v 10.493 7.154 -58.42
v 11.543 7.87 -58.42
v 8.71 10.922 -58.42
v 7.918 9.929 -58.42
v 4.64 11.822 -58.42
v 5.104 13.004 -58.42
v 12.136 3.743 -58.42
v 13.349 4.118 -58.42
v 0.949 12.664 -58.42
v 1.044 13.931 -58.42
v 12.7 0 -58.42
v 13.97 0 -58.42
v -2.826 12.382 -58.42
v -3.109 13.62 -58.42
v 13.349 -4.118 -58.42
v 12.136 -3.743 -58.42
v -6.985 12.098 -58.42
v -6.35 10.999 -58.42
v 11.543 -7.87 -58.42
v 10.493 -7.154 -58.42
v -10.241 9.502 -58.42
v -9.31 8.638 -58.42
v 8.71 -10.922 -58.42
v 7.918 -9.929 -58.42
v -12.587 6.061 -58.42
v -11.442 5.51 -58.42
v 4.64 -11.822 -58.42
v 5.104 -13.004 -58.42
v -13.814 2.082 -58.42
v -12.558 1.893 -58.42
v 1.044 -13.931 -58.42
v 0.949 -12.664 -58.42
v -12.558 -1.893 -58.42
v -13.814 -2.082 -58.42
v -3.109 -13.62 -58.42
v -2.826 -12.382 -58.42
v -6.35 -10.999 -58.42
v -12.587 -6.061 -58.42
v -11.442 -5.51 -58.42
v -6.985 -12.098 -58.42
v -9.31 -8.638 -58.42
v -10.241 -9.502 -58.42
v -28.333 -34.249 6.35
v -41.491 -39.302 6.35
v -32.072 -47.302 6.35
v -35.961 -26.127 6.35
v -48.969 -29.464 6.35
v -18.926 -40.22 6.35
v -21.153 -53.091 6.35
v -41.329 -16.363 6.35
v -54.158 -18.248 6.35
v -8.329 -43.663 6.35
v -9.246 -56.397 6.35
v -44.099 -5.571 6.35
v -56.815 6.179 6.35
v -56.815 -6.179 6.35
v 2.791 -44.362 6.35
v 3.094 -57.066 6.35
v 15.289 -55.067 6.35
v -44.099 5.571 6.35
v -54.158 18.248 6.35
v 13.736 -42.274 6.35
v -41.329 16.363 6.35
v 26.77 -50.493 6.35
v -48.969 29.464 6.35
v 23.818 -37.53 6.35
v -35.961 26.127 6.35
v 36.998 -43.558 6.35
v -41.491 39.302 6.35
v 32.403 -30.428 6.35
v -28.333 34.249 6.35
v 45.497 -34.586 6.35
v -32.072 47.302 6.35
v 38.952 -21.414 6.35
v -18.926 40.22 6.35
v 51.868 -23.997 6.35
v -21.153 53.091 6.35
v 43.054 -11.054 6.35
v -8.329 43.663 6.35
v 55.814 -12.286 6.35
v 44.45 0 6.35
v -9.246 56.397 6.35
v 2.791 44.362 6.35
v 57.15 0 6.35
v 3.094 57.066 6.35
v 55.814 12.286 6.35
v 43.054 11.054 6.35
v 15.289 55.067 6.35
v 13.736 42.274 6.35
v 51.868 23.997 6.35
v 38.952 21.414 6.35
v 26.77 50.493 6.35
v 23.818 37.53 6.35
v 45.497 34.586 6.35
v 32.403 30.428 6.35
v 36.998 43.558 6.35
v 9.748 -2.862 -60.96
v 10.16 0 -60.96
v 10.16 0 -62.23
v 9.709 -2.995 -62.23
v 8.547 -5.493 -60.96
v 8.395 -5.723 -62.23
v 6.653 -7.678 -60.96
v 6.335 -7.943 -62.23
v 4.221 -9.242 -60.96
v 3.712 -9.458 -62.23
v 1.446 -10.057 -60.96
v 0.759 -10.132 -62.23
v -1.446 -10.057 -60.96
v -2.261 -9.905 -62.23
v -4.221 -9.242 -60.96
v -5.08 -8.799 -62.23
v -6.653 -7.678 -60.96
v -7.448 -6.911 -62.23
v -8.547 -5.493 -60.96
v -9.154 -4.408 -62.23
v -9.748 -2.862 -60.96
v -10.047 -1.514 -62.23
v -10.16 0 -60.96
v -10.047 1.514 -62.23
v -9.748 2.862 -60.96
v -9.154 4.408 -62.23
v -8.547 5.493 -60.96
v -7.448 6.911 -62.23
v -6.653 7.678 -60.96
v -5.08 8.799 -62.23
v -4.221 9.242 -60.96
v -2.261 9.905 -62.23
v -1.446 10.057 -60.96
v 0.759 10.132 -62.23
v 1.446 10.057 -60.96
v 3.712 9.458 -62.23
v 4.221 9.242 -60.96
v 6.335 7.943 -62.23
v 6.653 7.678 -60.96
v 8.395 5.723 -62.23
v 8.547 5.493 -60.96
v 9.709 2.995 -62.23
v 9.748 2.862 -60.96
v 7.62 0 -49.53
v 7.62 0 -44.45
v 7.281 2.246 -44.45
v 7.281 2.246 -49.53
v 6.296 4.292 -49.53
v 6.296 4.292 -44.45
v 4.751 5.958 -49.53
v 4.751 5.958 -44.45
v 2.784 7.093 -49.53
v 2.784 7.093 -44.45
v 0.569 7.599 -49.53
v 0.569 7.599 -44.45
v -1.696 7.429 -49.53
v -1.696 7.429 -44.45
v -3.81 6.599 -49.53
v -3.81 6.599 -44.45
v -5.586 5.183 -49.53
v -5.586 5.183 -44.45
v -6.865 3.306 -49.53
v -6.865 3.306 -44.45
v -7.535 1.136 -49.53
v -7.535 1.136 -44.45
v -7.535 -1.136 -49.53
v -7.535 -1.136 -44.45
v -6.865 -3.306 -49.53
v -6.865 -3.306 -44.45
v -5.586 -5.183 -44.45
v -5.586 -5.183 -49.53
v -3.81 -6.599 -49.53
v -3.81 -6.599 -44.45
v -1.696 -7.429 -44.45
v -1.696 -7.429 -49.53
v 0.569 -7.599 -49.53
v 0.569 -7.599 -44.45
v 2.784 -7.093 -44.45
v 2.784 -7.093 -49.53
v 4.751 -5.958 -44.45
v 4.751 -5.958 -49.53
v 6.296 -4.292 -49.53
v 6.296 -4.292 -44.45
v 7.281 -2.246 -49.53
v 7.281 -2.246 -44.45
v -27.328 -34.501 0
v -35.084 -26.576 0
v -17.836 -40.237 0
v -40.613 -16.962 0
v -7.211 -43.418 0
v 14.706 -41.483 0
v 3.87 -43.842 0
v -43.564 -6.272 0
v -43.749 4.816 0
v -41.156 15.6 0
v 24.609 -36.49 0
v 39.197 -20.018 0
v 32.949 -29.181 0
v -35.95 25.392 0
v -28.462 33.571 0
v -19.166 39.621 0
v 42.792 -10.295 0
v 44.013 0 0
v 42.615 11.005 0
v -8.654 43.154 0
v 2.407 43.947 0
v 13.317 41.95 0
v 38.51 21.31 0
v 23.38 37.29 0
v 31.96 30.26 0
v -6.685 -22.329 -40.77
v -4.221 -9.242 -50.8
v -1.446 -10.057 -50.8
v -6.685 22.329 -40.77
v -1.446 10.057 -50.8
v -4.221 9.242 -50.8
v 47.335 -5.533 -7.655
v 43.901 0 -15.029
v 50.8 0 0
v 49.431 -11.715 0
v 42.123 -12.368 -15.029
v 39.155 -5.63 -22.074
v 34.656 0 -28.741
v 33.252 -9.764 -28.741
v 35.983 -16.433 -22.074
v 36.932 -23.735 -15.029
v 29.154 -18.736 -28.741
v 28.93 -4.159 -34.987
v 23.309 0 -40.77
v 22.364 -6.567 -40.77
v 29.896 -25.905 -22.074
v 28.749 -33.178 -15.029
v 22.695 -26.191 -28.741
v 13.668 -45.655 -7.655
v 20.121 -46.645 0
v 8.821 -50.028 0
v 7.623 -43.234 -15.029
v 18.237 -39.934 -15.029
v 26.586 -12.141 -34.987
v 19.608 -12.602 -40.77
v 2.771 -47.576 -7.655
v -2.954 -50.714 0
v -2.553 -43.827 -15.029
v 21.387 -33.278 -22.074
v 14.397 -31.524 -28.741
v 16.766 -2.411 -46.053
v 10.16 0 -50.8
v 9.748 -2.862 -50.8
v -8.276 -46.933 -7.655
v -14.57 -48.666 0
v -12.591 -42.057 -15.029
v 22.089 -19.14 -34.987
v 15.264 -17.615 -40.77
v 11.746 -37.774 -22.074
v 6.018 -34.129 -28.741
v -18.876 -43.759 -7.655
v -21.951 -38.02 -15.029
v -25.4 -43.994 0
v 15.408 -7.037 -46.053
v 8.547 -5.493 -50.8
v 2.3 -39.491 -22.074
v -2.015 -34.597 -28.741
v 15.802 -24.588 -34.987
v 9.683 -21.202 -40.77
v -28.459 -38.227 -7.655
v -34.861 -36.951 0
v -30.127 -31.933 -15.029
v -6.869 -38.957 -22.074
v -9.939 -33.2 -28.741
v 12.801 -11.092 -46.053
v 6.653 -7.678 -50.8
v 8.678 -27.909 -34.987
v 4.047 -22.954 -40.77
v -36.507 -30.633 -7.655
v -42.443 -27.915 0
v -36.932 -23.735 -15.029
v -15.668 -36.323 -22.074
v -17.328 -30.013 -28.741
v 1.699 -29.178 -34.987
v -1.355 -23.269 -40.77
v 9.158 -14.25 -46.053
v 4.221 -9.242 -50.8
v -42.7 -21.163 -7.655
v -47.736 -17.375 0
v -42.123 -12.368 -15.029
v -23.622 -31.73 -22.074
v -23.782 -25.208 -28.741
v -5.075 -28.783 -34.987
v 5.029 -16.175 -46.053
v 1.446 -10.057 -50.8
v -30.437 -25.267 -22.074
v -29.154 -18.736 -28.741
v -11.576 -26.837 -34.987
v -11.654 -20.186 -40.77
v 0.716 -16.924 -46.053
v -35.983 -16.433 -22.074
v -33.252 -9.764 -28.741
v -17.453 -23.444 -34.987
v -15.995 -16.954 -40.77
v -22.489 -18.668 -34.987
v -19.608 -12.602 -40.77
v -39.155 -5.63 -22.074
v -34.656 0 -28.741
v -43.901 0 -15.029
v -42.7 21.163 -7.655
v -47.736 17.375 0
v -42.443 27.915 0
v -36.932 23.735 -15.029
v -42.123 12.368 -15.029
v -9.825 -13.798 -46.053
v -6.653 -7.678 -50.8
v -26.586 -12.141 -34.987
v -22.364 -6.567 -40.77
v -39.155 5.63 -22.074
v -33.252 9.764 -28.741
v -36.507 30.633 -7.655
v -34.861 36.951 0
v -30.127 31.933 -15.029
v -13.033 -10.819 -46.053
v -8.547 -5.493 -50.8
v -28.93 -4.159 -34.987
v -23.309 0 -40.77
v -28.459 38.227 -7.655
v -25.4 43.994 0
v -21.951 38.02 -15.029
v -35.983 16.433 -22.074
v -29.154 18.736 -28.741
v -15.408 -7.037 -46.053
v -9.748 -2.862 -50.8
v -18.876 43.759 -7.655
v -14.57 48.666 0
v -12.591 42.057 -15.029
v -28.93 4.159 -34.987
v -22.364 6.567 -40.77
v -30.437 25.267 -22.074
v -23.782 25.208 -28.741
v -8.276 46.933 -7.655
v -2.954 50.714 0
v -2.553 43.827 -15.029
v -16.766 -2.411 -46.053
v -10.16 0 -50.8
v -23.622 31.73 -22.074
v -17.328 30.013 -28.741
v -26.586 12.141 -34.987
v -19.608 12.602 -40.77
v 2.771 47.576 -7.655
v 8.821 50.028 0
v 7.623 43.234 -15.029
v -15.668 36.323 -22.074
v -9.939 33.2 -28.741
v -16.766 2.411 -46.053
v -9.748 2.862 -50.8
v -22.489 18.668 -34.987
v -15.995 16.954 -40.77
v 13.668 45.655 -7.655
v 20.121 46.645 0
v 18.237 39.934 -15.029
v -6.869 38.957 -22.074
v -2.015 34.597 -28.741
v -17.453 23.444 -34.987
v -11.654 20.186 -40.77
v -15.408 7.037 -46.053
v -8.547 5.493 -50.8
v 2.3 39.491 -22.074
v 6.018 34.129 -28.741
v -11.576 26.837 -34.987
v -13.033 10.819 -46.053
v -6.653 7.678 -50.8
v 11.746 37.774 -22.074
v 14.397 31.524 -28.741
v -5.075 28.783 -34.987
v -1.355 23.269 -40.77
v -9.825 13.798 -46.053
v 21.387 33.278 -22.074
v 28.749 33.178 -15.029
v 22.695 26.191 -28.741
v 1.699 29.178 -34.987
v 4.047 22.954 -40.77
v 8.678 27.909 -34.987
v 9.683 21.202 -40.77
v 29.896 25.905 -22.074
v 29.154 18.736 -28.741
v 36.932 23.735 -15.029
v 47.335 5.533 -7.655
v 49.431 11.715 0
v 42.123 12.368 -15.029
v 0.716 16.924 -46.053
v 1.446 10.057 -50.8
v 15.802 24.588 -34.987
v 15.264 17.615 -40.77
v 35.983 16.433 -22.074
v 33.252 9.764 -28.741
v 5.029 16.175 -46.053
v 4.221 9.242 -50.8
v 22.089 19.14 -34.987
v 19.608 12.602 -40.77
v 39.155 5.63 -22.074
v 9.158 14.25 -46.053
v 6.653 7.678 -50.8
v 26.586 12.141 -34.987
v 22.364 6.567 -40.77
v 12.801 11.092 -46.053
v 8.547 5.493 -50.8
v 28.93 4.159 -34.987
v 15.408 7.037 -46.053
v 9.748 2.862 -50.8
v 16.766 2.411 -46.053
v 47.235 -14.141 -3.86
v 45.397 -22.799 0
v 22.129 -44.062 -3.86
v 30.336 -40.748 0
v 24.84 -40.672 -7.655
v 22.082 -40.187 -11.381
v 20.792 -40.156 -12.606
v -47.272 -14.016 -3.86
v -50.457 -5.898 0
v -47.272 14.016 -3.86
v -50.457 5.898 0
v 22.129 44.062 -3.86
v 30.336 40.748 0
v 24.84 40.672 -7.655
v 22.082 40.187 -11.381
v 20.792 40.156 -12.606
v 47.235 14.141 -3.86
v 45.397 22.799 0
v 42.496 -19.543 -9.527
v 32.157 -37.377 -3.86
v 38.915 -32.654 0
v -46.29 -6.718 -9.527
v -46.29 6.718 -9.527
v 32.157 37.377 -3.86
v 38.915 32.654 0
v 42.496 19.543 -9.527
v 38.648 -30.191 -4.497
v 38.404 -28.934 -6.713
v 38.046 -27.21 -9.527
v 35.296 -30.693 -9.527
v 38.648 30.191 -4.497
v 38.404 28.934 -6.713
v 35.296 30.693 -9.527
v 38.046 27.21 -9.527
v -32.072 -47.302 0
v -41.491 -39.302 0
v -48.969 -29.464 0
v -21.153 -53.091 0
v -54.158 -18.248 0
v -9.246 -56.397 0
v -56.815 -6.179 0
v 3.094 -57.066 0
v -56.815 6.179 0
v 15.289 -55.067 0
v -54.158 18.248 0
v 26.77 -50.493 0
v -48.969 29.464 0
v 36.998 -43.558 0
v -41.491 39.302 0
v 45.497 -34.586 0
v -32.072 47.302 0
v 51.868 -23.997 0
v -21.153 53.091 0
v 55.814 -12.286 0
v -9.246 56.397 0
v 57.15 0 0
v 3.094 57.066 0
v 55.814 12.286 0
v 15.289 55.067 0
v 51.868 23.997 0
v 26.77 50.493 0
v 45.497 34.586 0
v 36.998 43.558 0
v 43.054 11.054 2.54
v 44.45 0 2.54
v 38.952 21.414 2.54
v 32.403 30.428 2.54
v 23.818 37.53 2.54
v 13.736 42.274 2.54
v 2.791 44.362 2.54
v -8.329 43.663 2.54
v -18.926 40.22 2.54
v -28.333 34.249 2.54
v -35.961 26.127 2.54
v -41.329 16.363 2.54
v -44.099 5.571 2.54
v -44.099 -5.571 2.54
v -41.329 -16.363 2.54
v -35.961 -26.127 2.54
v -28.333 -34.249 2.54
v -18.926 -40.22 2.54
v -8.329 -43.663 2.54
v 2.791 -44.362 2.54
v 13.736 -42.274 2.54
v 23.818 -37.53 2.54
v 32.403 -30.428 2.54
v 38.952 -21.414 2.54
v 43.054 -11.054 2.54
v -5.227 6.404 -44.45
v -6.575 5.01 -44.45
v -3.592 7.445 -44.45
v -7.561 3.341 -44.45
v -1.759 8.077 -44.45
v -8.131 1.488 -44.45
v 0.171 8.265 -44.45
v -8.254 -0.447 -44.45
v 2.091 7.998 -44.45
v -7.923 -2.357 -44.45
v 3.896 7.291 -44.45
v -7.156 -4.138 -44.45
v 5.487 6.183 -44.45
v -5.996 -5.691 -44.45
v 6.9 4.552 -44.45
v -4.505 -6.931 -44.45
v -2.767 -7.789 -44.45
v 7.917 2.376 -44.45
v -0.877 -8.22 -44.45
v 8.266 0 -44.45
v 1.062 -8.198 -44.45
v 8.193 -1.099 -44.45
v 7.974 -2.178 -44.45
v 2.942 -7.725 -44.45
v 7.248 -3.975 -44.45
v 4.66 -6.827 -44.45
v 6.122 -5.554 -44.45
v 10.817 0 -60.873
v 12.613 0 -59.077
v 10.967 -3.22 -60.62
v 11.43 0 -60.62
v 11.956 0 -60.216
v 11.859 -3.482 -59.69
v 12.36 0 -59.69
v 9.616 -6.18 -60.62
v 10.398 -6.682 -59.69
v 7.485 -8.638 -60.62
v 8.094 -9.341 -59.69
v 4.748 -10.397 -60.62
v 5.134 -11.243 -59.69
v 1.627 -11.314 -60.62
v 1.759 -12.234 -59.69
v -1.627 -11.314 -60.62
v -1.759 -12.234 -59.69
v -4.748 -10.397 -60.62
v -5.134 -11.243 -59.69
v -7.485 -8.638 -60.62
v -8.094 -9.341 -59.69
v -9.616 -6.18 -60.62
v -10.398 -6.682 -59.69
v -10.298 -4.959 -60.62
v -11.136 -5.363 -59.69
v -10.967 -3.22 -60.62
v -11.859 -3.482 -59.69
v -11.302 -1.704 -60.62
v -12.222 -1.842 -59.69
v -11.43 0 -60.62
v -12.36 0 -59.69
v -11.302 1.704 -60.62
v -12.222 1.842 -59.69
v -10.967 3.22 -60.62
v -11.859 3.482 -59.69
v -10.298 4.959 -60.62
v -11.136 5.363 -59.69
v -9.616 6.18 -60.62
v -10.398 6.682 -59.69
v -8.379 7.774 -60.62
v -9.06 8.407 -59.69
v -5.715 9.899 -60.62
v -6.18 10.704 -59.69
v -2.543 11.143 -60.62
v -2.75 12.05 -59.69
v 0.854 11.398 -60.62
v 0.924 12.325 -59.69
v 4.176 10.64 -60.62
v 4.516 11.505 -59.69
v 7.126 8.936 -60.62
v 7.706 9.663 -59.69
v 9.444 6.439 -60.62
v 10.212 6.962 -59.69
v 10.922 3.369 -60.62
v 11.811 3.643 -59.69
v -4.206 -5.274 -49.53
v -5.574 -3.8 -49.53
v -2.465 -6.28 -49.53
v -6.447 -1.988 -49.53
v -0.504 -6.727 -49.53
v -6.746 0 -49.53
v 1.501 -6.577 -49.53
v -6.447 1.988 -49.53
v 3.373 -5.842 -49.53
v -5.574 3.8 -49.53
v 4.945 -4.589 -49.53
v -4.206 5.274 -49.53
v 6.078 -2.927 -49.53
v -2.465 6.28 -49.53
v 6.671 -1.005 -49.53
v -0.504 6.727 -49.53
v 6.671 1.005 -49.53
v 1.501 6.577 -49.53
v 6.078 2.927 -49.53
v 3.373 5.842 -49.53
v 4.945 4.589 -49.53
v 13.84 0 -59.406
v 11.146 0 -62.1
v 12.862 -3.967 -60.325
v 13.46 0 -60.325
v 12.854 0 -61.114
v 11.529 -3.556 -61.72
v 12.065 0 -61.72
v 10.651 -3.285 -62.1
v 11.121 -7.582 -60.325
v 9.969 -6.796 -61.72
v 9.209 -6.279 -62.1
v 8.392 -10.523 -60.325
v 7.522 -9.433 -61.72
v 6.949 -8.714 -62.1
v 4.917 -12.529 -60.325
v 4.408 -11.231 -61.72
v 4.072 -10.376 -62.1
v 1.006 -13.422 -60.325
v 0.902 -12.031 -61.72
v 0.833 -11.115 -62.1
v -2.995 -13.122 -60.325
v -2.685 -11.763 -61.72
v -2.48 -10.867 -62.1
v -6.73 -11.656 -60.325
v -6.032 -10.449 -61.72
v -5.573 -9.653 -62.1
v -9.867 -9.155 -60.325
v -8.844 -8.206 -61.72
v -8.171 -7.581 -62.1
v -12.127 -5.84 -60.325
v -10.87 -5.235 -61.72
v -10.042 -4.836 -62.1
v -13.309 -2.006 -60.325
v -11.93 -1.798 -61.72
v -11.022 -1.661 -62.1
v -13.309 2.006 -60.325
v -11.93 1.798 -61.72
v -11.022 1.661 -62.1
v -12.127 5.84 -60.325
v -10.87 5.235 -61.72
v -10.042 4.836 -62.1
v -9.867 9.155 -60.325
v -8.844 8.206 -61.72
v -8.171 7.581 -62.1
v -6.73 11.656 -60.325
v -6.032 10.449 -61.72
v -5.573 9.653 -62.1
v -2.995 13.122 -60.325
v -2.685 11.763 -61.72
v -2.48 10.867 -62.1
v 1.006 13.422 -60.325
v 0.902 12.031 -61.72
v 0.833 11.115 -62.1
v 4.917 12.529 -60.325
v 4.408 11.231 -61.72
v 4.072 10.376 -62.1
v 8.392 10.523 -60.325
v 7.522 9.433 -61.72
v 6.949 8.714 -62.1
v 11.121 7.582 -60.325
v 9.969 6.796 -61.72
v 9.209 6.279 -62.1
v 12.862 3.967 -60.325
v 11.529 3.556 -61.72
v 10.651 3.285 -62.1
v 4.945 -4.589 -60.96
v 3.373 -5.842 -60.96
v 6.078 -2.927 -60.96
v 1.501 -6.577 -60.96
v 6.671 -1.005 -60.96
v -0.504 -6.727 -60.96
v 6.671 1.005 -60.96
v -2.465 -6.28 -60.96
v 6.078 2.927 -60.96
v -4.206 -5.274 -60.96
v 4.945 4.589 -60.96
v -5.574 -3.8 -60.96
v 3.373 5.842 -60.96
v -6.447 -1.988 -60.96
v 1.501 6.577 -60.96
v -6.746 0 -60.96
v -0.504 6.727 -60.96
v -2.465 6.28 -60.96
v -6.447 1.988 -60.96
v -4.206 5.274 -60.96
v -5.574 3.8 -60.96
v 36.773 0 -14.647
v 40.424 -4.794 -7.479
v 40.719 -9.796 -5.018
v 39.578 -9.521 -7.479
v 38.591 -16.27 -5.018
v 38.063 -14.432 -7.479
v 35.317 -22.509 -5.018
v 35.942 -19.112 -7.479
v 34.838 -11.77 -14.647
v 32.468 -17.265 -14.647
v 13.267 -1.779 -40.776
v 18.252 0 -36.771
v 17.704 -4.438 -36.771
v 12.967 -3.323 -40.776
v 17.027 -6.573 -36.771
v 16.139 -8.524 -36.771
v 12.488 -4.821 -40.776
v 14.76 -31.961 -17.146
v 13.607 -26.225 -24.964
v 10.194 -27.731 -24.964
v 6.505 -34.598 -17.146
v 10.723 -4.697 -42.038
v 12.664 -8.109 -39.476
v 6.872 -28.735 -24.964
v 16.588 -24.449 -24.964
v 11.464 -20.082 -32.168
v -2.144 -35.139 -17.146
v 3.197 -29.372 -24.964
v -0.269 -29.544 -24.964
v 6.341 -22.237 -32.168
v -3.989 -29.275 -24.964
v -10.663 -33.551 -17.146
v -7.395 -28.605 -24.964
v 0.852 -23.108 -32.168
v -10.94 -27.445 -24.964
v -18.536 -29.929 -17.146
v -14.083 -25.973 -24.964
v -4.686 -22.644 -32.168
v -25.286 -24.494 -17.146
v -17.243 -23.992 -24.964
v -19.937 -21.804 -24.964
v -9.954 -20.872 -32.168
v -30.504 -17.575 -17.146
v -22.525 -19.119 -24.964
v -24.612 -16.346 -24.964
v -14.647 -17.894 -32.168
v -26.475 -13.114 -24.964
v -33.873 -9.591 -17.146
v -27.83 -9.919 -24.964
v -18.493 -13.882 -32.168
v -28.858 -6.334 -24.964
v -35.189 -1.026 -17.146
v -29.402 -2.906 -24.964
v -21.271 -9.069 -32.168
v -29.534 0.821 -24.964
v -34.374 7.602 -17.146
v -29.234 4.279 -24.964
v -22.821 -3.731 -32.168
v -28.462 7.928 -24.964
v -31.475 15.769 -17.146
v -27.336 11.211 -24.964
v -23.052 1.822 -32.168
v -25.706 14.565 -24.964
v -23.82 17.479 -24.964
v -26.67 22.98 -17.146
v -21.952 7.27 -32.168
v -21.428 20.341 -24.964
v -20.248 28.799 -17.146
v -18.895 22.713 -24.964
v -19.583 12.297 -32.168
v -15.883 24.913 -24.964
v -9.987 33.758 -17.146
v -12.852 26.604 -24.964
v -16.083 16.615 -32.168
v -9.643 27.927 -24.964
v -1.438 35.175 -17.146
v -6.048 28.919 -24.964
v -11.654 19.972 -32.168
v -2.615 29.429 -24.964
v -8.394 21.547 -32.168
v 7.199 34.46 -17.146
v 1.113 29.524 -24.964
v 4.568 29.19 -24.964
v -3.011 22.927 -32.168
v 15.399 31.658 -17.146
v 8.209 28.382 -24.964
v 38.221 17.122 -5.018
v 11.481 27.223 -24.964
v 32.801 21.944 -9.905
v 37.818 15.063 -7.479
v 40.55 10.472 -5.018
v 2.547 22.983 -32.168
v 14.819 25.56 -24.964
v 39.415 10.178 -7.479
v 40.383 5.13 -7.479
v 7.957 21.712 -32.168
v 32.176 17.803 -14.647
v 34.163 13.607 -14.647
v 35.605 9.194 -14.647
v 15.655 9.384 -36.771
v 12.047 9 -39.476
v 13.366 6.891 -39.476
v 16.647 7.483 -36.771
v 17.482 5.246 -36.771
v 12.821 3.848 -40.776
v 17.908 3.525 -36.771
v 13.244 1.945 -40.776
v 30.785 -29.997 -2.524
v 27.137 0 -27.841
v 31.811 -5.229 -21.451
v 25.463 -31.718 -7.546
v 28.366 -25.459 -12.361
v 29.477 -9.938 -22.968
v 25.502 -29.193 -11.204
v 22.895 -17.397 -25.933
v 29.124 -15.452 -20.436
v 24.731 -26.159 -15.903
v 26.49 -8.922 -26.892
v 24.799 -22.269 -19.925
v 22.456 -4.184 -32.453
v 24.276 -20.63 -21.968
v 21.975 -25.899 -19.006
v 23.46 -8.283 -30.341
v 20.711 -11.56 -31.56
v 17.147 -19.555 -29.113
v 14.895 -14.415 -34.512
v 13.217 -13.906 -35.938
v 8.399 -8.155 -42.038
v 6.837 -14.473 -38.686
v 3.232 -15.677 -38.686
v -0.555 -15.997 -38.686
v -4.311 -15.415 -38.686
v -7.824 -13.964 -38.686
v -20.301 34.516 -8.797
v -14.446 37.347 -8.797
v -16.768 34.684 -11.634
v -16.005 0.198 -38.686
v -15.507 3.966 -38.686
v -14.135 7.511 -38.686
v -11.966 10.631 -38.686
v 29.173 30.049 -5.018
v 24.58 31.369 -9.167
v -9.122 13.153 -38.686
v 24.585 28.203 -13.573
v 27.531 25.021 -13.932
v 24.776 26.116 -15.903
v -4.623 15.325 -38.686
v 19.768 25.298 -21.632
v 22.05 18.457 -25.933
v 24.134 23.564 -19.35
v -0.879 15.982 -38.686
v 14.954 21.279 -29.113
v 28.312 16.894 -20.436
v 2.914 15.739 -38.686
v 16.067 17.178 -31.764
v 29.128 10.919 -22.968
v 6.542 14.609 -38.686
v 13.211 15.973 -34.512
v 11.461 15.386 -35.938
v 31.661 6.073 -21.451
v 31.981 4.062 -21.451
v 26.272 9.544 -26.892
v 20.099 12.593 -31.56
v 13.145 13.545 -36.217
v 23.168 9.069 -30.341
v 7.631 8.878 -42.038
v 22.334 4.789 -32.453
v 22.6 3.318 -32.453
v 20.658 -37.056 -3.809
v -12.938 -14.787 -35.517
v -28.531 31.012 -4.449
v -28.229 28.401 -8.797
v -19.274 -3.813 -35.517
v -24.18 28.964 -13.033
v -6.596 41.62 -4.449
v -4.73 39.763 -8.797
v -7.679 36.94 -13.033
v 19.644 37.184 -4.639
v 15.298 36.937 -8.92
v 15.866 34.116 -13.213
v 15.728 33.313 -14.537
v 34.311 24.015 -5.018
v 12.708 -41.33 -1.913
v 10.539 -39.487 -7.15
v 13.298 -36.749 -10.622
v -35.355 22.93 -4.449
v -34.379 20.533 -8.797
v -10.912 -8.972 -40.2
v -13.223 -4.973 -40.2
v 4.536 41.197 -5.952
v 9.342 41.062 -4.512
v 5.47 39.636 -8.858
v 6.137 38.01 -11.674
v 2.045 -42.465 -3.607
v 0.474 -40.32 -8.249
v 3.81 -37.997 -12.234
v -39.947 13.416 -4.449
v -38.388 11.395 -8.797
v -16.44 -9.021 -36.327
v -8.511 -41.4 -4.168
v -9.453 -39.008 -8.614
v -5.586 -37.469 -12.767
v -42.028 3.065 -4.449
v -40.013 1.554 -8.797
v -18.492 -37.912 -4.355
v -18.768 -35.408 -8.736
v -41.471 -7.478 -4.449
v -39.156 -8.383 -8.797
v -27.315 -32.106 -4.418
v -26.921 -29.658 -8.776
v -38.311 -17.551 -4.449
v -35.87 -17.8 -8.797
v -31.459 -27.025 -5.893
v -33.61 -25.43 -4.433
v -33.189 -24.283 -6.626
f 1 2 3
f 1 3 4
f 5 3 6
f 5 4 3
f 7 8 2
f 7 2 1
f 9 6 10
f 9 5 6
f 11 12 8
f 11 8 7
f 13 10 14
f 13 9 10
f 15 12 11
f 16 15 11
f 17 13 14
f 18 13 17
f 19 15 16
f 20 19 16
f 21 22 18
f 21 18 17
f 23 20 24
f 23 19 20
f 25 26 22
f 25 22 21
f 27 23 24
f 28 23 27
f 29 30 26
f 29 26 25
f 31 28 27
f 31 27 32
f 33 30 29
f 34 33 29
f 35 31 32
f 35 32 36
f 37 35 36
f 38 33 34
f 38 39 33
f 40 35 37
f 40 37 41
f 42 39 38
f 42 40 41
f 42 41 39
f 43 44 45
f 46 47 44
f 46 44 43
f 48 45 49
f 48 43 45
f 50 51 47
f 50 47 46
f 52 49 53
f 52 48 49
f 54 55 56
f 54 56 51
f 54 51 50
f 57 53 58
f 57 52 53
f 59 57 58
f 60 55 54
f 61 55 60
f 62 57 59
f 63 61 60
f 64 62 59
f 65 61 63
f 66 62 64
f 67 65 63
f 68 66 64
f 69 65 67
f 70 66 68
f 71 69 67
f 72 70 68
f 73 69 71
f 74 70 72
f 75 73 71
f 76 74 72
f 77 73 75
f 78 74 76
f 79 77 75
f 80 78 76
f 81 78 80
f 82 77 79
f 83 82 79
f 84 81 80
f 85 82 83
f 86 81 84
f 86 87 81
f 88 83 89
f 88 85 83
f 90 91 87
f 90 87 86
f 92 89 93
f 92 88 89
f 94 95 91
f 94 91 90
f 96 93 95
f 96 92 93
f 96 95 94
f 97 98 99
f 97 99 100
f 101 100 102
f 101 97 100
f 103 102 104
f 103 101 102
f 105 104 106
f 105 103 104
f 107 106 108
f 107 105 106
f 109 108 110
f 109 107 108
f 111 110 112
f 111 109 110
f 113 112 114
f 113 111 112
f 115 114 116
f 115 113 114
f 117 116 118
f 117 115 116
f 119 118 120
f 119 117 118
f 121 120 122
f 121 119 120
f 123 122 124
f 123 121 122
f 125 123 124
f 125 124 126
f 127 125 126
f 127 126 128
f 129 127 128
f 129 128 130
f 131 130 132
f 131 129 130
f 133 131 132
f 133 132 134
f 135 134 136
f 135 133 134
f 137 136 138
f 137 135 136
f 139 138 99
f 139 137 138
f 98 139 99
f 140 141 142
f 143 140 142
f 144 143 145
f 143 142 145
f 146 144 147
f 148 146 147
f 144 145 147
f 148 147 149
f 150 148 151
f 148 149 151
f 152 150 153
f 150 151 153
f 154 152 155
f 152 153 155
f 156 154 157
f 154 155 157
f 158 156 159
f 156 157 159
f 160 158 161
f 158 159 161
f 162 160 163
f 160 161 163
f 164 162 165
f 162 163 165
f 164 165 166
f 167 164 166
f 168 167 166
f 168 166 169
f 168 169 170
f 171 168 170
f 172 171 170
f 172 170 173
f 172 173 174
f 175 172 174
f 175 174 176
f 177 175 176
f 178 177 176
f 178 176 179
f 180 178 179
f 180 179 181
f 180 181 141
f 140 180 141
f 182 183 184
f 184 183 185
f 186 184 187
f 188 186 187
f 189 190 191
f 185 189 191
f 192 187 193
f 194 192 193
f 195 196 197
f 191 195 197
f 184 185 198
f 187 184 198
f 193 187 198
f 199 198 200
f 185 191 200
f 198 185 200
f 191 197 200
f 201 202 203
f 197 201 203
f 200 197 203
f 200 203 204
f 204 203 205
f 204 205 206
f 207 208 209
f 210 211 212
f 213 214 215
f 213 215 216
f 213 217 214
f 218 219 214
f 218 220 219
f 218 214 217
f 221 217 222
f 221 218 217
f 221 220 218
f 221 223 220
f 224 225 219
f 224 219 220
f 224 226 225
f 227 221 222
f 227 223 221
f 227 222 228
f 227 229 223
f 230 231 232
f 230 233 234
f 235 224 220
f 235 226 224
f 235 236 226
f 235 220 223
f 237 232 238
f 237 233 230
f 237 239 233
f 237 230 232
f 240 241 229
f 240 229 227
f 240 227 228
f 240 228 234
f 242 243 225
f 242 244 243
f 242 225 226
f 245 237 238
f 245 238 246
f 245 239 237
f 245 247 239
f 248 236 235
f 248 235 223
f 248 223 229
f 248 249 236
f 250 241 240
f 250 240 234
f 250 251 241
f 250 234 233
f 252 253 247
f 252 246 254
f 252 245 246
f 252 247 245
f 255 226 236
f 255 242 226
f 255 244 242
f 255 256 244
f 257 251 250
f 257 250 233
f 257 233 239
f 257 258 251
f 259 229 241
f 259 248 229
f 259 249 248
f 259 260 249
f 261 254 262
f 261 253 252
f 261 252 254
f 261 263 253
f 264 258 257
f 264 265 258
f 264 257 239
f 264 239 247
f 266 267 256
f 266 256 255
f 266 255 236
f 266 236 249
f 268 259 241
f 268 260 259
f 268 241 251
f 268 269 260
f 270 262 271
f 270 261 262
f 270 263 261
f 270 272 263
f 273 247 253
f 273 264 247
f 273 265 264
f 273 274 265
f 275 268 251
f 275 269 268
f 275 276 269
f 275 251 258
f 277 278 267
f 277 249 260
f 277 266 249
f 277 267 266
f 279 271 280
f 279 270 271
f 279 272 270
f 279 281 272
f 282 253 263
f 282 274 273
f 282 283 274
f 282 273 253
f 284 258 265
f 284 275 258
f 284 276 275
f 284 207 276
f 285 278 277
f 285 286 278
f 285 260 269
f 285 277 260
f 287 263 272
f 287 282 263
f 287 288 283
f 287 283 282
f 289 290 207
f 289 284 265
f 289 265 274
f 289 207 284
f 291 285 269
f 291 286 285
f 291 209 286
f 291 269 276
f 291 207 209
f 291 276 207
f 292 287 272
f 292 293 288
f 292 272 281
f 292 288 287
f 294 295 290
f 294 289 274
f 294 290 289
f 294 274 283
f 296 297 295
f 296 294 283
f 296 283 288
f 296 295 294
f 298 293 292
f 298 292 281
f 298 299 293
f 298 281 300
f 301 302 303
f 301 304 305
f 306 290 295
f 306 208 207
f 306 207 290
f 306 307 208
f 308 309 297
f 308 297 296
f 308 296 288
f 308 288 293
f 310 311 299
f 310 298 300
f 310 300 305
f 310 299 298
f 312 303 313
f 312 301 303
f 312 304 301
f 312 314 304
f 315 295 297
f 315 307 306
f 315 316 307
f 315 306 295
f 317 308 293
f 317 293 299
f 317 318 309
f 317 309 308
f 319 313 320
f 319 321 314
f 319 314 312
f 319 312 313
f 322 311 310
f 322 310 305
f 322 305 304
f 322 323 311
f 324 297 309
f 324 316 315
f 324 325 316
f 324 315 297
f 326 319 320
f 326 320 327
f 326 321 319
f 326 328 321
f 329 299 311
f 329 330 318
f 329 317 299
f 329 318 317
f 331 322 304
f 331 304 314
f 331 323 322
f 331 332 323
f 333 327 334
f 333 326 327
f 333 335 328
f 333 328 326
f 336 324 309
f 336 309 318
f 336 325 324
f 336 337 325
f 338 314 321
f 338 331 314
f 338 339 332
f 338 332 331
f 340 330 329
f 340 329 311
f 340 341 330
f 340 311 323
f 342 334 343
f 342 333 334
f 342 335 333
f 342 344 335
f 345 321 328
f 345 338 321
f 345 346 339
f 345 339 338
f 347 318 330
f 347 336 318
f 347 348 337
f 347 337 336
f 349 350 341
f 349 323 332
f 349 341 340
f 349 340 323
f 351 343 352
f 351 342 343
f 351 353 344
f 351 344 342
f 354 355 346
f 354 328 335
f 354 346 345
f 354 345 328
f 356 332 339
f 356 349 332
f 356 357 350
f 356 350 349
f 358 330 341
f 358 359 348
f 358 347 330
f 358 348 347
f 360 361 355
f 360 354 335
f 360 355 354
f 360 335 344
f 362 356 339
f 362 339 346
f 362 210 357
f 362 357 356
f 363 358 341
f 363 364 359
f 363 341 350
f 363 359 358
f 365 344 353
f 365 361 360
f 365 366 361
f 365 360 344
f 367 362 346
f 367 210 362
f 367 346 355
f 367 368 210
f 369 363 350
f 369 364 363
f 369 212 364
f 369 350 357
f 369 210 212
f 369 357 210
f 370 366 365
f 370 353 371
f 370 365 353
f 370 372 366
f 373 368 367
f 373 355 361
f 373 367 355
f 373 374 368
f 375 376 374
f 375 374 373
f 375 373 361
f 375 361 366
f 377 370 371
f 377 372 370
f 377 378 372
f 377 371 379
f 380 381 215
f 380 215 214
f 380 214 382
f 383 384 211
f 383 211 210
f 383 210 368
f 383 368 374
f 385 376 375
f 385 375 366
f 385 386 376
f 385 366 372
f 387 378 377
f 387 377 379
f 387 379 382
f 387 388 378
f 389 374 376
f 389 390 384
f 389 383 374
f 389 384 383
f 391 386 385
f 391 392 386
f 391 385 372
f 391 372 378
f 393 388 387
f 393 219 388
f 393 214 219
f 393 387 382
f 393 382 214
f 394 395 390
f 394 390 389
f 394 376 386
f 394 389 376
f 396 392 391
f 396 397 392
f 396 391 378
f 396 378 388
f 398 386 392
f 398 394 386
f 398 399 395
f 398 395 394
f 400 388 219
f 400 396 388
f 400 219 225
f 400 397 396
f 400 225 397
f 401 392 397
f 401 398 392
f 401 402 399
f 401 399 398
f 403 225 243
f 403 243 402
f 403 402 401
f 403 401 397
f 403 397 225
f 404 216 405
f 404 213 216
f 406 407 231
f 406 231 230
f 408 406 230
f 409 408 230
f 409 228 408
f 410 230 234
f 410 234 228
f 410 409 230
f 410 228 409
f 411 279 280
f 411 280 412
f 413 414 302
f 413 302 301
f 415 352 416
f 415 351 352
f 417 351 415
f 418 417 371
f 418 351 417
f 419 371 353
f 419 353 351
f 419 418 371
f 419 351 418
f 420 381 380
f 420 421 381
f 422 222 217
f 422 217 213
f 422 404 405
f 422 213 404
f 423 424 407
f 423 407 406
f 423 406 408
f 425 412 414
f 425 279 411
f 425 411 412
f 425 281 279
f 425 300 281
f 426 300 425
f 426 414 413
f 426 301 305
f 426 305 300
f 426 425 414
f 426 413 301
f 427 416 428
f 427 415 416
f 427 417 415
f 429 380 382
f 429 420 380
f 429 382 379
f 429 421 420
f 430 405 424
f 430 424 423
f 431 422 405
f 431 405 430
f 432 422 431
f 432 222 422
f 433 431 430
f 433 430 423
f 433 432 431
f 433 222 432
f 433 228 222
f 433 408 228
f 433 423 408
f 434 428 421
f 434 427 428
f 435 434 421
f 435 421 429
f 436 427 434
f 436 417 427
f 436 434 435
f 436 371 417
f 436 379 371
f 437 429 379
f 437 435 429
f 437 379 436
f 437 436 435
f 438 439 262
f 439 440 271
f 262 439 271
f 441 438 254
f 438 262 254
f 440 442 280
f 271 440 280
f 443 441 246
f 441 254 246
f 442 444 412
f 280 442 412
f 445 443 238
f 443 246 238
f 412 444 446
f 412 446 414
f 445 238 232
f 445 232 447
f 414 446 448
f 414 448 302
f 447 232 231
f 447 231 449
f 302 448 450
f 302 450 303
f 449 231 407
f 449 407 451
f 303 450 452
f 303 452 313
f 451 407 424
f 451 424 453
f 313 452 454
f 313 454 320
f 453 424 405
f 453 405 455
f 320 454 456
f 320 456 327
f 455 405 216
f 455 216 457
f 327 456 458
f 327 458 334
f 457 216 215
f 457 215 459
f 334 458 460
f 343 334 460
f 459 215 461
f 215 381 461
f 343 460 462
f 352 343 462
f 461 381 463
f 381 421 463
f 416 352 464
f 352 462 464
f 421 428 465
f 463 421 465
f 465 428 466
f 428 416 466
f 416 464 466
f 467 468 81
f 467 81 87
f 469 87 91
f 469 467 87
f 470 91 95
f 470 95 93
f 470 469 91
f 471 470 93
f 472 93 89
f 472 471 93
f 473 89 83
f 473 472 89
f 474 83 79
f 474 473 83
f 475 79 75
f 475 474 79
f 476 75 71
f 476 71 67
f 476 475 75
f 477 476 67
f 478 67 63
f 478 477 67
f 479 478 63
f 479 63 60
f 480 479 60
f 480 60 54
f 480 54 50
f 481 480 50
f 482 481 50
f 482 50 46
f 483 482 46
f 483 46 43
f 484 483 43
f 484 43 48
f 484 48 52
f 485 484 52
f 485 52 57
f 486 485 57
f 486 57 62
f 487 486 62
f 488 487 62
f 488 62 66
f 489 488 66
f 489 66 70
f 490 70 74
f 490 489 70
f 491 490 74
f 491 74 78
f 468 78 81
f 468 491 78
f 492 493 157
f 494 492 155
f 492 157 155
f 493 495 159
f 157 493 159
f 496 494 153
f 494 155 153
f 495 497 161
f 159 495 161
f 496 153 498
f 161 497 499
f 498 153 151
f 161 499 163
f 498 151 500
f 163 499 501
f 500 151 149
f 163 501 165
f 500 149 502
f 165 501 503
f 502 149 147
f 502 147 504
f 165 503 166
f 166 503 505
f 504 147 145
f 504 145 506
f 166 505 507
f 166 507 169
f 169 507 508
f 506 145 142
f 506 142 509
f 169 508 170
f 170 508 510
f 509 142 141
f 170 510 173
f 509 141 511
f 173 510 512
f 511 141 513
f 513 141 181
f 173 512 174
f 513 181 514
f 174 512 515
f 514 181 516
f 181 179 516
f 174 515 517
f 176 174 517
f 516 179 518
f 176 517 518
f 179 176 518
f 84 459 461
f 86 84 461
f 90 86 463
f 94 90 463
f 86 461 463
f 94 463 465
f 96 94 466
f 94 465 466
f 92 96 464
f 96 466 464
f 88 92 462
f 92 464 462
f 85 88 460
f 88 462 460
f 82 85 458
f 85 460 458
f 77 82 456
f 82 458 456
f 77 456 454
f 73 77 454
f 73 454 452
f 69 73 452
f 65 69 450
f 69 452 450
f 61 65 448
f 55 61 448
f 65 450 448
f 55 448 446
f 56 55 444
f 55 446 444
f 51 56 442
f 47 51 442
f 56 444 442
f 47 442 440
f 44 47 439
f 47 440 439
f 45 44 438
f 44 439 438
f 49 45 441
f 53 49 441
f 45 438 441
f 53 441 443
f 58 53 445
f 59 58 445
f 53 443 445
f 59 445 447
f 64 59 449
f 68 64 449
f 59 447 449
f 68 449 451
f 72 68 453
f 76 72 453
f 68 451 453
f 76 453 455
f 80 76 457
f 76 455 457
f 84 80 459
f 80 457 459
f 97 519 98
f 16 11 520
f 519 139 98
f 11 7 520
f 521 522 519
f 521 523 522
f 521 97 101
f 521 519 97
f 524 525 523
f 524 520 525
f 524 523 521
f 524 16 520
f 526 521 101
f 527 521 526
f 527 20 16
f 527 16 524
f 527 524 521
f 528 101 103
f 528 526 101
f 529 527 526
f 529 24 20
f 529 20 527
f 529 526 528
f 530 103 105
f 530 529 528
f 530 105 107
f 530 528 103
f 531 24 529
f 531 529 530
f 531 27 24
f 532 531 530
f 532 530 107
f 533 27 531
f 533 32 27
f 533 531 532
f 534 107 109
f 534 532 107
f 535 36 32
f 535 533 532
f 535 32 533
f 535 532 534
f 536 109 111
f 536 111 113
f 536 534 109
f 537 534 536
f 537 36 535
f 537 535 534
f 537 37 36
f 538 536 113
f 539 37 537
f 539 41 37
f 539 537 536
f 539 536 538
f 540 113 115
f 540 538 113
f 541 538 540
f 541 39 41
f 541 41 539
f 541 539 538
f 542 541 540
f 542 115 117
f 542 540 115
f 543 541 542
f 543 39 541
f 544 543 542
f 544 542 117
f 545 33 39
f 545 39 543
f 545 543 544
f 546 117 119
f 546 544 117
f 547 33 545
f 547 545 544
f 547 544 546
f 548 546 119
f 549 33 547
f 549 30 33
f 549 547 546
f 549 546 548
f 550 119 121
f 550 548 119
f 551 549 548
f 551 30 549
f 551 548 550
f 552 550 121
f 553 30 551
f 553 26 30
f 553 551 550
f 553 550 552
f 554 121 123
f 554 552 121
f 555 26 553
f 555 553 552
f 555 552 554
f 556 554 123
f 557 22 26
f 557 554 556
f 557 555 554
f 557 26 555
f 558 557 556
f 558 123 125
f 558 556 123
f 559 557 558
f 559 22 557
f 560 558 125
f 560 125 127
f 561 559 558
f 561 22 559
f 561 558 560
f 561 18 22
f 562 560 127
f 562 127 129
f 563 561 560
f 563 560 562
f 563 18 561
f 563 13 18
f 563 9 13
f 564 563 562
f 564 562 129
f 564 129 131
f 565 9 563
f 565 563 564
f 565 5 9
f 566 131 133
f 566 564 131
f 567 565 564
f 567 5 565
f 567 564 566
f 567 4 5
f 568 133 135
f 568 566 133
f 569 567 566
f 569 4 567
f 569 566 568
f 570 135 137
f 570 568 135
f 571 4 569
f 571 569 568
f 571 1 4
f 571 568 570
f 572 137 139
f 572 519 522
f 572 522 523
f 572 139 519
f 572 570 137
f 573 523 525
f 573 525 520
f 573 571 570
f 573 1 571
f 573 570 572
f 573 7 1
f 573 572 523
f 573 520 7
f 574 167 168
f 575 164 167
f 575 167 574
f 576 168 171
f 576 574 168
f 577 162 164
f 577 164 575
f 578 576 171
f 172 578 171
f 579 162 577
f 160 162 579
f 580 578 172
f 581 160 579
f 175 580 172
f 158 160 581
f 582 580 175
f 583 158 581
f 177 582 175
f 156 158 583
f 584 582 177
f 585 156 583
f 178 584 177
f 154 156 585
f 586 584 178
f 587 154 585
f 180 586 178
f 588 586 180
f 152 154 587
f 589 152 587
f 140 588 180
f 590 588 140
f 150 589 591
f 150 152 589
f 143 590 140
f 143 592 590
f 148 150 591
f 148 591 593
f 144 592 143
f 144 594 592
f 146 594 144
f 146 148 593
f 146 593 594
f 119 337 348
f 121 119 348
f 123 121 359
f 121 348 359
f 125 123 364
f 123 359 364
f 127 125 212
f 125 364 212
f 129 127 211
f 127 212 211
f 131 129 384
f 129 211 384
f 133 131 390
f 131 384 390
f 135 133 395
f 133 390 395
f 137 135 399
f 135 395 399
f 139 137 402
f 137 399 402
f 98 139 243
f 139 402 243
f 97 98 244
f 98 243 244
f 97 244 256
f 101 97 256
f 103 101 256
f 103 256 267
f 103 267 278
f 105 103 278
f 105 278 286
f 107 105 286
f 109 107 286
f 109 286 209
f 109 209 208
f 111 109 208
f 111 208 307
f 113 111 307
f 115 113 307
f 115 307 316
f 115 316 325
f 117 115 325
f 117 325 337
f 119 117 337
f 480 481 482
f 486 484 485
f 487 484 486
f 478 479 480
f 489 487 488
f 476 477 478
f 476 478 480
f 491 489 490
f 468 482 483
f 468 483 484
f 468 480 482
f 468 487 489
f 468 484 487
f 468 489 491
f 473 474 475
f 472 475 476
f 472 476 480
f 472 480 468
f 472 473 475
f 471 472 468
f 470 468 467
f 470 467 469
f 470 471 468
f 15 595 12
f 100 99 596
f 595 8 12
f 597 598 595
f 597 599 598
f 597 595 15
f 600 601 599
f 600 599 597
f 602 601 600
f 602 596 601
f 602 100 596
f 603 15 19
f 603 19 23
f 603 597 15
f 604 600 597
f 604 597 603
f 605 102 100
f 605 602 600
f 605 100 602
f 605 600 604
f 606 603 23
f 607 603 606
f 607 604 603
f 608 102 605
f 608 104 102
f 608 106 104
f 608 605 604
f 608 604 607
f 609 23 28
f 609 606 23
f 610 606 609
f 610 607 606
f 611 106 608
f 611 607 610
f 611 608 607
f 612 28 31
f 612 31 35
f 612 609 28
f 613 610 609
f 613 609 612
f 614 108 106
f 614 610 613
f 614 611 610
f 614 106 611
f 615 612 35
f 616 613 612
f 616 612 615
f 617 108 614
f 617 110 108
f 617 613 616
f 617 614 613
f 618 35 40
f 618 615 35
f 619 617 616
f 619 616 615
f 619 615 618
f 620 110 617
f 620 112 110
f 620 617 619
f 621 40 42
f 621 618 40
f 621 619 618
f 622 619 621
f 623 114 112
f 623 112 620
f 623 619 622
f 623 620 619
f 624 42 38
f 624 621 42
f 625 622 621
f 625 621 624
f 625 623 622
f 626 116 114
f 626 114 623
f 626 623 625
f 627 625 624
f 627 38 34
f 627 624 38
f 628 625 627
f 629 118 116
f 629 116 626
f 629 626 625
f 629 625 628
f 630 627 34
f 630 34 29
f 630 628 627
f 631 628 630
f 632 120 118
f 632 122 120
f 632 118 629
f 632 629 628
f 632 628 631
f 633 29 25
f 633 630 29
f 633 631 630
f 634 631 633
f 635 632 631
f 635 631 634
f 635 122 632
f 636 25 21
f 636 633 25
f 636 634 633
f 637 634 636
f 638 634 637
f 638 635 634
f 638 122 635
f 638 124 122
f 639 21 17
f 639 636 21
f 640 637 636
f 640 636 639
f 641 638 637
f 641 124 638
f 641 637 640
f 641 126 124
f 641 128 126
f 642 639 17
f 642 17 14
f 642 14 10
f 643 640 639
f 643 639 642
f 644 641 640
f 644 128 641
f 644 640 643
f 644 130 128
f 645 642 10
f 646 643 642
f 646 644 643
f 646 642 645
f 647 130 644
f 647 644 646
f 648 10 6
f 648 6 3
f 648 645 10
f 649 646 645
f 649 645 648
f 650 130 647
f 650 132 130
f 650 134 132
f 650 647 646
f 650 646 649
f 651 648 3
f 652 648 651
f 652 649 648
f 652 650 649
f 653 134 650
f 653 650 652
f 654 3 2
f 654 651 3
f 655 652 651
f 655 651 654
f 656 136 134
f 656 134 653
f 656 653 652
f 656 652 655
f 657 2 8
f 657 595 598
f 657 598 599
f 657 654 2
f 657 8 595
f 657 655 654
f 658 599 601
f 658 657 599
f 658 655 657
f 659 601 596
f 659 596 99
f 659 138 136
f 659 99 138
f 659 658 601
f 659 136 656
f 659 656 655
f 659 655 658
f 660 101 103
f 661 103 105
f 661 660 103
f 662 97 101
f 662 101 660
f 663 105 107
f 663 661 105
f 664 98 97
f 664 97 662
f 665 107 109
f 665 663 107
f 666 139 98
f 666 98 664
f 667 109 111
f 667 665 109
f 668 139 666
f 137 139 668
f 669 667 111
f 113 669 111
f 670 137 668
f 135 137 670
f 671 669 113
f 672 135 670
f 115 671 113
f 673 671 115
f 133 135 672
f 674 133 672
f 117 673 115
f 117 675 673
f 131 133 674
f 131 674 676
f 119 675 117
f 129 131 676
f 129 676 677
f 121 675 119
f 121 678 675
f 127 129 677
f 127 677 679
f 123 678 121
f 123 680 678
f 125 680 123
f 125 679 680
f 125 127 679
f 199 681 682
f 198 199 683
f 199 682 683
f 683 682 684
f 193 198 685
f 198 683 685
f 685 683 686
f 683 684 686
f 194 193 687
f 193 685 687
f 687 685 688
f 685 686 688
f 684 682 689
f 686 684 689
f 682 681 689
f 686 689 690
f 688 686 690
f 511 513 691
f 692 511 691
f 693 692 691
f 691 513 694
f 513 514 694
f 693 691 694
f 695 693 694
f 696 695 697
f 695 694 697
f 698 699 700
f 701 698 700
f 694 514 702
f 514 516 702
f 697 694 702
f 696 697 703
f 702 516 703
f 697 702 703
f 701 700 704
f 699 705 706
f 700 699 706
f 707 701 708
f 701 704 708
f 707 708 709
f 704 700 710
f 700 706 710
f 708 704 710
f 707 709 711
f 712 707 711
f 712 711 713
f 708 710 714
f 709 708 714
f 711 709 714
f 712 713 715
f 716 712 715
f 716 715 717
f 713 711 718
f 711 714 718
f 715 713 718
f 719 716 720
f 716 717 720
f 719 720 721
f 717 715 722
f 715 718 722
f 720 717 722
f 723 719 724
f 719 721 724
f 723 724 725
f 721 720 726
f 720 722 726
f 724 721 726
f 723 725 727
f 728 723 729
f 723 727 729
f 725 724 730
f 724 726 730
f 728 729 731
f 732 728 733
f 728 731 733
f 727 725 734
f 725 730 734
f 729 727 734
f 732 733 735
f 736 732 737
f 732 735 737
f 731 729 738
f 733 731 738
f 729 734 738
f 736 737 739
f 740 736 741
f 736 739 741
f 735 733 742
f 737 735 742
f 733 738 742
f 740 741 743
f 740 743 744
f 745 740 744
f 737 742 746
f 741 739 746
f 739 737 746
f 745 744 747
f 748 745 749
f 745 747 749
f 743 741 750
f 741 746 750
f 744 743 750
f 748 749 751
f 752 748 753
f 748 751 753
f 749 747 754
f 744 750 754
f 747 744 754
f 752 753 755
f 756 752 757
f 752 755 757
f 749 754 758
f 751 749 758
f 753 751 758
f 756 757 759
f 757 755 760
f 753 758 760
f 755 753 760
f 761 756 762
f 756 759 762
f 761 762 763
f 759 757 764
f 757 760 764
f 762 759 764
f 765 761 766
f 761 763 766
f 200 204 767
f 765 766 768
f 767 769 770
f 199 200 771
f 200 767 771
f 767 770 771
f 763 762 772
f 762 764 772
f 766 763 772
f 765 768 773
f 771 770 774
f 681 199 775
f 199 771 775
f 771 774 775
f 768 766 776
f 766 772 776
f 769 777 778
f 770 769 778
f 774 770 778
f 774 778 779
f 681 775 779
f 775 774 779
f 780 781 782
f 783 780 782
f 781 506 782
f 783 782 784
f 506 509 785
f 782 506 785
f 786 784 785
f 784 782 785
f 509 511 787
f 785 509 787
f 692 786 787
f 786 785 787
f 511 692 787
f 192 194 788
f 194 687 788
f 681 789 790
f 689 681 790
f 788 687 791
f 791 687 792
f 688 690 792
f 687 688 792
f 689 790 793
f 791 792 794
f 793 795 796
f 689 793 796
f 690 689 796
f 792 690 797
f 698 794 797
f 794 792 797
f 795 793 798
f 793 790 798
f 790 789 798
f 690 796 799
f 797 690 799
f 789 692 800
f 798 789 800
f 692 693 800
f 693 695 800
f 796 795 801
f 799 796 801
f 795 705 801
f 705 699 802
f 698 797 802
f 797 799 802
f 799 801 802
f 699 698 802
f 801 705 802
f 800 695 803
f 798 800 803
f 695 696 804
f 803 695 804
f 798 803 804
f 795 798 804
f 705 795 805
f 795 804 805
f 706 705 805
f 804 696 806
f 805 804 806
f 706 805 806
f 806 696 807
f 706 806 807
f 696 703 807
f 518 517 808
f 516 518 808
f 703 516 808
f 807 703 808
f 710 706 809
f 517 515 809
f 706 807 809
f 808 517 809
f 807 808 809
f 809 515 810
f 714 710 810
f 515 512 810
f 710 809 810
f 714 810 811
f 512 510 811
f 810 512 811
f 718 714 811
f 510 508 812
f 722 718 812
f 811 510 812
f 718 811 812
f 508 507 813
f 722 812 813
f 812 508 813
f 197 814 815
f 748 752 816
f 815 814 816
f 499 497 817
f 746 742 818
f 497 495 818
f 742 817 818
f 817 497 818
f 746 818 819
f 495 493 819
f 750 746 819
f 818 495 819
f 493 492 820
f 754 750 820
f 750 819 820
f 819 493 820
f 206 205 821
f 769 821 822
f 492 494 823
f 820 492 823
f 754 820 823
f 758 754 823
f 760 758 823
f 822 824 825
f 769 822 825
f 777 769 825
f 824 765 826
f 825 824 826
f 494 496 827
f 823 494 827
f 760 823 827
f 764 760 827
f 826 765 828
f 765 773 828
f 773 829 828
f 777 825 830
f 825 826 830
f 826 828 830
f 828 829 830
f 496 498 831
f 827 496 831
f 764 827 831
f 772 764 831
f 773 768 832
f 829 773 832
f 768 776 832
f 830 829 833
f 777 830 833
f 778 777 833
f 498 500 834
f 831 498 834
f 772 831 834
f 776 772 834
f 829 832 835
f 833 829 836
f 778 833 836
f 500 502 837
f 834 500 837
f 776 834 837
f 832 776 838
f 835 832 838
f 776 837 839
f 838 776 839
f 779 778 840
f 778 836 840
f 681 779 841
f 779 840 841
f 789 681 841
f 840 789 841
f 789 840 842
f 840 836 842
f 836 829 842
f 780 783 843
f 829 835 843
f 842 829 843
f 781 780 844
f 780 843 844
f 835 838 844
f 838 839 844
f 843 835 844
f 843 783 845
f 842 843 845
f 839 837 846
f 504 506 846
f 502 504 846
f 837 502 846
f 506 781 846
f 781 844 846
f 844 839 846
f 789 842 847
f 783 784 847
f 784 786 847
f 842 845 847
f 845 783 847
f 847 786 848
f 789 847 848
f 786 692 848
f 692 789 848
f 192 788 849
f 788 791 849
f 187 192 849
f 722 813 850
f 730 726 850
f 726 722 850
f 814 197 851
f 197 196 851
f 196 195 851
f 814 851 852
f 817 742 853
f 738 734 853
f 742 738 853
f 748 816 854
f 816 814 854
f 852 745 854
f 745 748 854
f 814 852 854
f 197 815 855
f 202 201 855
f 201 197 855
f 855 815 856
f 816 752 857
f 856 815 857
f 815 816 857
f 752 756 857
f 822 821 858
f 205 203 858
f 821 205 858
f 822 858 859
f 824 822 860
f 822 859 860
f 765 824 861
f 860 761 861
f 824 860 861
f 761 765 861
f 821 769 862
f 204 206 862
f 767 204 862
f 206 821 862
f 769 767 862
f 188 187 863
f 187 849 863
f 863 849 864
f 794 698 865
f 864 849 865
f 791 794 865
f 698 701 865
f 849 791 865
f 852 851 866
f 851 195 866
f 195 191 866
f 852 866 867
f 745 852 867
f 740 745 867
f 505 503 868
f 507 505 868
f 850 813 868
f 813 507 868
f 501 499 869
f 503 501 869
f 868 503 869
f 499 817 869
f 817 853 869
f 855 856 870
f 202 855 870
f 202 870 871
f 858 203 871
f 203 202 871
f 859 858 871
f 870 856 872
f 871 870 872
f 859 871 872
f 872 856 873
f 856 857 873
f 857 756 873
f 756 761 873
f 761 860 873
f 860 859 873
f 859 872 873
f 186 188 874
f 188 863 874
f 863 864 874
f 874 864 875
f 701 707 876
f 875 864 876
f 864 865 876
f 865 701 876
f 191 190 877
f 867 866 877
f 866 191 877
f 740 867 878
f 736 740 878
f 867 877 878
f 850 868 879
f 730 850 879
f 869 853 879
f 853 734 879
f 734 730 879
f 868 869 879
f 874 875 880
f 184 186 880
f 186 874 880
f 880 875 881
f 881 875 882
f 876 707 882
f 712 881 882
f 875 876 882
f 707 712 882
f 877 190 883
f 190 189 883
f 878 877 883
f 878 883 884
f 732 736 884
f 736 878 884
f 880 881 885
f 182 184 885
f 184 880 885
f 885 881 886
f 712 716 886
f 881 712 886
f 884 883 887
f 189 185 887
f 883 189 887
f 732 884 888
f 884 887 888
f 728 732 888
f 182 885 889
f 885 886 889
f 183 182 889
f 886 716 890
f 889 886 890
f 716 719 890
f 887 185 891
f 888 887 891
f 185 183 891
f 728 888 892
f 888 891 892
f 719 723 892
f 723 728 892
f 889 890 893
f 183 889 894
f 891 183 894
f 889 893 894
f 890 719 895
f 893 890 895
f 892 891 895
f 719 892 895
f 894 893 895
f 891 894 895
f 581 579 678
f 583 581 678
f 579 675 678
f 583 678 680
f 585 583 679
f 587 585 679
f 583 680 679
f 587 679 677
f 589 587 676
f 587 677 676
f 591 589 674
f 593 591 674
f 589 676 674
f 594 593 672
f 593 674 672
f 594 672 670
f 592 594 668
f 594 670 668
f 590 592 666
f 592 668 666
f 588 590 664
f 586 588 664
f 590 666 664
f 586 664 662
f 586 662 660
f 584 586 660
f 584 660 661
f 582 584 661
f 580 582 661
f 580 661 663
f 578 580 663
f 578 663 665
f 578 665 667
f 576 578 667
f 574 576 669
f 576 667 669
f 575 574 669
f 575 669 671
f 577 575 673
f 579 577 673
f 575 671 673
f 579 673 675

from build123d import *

# Parameters (mm, degrees)
LENSSHELL_T          = -6.35
SKETCH2_R            = 10.16
LENSNECK_DEPTH       = 10.16
BULBHOLE_D           = 13.49248
BULBHOLE_CBORE_D     = 15.24
BULBHOLE_CBORE_DEPTH = 5.08
SKETCH20_R           = 57.15
SKETCH20_R_2         = 44.45
LENSCOVER_DEPTH      = 6.35
SKETCH22_R           = 44.45
LENSSHIELD_DEPTH     = 2.54


with BuildPart() as part:
    # Sketch1 → BaseRevolve (revolve)
    with BuildSketch(Plane(origin=(0, 0, 0), x_dir=(0, 0, -1), z_dir=(1, 0, 0)), mode=Mode.PRIVATE) as baserevolve_sk:
        with BuildLine():
            Line((0, 0), (0, 50.8))
            ThreePointArc((0, 50.8), (28.740706548, 34.655883185), (50.8, 10.16))
            Line((50.8, 10.16), (50.8, 0))
            Line((50.8, 0), (0, 0))
        make_face()
    revolve(baserevolve_sk.sketch.rotate(Axis((0, 0, 43.730744337), (0, 0, -1)), 90), axis=Axis((0, 0, 43.730744337), (0, 0, -1)))

    # LensShell
    lensshell_openings = [part.faces().sort_by_distance(p)[0] for p in [
        (0, 0, 0),
    ]]
    offset(amount=LENSSHELL_T, openings=lensshell_openings, kind=Kind.INTERSECTION)

    # Sketch2 → LensNeck (add)
    with BuildSketch(Plane(origin=(0, 0, -50.8), x_dir=(-1, 0, 0), z_dir=(0, 0, -1))):
        Circle(SKETCH2_R)
    extrude(amount=LENSNECK_DEPTH)

    # BulbHole (through all)
    with Locations(Plane.XY.offset(-44.45)):
        with Locations((0, 0)):
            CounterBoreHole(BULBHOLE_D / 2, BULBHOLE_CBORE_D / 2, BULBHOLE_CBORE_DEPTH)

    # Sketch19 → LensConnector (revolve)
    with BuildSketch(Plane(origin=(0, 0, 0), x_dir=(0, 0, -1), z_dir=(1, 0, 0)), mode=Mode.PRIVATE) as lensconnector_sk:
        with BuildLine():
            ThreePointArc((60.96, 10.16), (60.216051224, 11.956051224), (58.42, 12.7))
            Line((58.42, 12.7), (58.42, 13.97))
            ThreePointArc((58.42, 13.97), (61.114076836, 12.854076836), (62.23, 10.16))
            Line((62.23, 10.16), (60.96, 10.16))
        make_face()
    revolve(lensconnector_sk.sketch.rotate(Axis((0, 0, 0), (0, 0, -1)), 90), axis=Axis((0, 0, 0), (0, 0, -1)))

    # Sketch20 → LensCover (add)
    with BuildSketch(Plane.XY):
        Circle(SKETCH20_R)
        Circle(SKETCH20_R_2, mode=Mode.SUBTRACT)
    extrude(amount=LENSCOVER_DEPTH)

    # Sketch22 → LensShield (add)
    with BuildSketch(Plane.XY):
        Circle(SKETCH22_R)
    extrude(amount=LENSSHIELD_DEPTH)


solid = part.part
